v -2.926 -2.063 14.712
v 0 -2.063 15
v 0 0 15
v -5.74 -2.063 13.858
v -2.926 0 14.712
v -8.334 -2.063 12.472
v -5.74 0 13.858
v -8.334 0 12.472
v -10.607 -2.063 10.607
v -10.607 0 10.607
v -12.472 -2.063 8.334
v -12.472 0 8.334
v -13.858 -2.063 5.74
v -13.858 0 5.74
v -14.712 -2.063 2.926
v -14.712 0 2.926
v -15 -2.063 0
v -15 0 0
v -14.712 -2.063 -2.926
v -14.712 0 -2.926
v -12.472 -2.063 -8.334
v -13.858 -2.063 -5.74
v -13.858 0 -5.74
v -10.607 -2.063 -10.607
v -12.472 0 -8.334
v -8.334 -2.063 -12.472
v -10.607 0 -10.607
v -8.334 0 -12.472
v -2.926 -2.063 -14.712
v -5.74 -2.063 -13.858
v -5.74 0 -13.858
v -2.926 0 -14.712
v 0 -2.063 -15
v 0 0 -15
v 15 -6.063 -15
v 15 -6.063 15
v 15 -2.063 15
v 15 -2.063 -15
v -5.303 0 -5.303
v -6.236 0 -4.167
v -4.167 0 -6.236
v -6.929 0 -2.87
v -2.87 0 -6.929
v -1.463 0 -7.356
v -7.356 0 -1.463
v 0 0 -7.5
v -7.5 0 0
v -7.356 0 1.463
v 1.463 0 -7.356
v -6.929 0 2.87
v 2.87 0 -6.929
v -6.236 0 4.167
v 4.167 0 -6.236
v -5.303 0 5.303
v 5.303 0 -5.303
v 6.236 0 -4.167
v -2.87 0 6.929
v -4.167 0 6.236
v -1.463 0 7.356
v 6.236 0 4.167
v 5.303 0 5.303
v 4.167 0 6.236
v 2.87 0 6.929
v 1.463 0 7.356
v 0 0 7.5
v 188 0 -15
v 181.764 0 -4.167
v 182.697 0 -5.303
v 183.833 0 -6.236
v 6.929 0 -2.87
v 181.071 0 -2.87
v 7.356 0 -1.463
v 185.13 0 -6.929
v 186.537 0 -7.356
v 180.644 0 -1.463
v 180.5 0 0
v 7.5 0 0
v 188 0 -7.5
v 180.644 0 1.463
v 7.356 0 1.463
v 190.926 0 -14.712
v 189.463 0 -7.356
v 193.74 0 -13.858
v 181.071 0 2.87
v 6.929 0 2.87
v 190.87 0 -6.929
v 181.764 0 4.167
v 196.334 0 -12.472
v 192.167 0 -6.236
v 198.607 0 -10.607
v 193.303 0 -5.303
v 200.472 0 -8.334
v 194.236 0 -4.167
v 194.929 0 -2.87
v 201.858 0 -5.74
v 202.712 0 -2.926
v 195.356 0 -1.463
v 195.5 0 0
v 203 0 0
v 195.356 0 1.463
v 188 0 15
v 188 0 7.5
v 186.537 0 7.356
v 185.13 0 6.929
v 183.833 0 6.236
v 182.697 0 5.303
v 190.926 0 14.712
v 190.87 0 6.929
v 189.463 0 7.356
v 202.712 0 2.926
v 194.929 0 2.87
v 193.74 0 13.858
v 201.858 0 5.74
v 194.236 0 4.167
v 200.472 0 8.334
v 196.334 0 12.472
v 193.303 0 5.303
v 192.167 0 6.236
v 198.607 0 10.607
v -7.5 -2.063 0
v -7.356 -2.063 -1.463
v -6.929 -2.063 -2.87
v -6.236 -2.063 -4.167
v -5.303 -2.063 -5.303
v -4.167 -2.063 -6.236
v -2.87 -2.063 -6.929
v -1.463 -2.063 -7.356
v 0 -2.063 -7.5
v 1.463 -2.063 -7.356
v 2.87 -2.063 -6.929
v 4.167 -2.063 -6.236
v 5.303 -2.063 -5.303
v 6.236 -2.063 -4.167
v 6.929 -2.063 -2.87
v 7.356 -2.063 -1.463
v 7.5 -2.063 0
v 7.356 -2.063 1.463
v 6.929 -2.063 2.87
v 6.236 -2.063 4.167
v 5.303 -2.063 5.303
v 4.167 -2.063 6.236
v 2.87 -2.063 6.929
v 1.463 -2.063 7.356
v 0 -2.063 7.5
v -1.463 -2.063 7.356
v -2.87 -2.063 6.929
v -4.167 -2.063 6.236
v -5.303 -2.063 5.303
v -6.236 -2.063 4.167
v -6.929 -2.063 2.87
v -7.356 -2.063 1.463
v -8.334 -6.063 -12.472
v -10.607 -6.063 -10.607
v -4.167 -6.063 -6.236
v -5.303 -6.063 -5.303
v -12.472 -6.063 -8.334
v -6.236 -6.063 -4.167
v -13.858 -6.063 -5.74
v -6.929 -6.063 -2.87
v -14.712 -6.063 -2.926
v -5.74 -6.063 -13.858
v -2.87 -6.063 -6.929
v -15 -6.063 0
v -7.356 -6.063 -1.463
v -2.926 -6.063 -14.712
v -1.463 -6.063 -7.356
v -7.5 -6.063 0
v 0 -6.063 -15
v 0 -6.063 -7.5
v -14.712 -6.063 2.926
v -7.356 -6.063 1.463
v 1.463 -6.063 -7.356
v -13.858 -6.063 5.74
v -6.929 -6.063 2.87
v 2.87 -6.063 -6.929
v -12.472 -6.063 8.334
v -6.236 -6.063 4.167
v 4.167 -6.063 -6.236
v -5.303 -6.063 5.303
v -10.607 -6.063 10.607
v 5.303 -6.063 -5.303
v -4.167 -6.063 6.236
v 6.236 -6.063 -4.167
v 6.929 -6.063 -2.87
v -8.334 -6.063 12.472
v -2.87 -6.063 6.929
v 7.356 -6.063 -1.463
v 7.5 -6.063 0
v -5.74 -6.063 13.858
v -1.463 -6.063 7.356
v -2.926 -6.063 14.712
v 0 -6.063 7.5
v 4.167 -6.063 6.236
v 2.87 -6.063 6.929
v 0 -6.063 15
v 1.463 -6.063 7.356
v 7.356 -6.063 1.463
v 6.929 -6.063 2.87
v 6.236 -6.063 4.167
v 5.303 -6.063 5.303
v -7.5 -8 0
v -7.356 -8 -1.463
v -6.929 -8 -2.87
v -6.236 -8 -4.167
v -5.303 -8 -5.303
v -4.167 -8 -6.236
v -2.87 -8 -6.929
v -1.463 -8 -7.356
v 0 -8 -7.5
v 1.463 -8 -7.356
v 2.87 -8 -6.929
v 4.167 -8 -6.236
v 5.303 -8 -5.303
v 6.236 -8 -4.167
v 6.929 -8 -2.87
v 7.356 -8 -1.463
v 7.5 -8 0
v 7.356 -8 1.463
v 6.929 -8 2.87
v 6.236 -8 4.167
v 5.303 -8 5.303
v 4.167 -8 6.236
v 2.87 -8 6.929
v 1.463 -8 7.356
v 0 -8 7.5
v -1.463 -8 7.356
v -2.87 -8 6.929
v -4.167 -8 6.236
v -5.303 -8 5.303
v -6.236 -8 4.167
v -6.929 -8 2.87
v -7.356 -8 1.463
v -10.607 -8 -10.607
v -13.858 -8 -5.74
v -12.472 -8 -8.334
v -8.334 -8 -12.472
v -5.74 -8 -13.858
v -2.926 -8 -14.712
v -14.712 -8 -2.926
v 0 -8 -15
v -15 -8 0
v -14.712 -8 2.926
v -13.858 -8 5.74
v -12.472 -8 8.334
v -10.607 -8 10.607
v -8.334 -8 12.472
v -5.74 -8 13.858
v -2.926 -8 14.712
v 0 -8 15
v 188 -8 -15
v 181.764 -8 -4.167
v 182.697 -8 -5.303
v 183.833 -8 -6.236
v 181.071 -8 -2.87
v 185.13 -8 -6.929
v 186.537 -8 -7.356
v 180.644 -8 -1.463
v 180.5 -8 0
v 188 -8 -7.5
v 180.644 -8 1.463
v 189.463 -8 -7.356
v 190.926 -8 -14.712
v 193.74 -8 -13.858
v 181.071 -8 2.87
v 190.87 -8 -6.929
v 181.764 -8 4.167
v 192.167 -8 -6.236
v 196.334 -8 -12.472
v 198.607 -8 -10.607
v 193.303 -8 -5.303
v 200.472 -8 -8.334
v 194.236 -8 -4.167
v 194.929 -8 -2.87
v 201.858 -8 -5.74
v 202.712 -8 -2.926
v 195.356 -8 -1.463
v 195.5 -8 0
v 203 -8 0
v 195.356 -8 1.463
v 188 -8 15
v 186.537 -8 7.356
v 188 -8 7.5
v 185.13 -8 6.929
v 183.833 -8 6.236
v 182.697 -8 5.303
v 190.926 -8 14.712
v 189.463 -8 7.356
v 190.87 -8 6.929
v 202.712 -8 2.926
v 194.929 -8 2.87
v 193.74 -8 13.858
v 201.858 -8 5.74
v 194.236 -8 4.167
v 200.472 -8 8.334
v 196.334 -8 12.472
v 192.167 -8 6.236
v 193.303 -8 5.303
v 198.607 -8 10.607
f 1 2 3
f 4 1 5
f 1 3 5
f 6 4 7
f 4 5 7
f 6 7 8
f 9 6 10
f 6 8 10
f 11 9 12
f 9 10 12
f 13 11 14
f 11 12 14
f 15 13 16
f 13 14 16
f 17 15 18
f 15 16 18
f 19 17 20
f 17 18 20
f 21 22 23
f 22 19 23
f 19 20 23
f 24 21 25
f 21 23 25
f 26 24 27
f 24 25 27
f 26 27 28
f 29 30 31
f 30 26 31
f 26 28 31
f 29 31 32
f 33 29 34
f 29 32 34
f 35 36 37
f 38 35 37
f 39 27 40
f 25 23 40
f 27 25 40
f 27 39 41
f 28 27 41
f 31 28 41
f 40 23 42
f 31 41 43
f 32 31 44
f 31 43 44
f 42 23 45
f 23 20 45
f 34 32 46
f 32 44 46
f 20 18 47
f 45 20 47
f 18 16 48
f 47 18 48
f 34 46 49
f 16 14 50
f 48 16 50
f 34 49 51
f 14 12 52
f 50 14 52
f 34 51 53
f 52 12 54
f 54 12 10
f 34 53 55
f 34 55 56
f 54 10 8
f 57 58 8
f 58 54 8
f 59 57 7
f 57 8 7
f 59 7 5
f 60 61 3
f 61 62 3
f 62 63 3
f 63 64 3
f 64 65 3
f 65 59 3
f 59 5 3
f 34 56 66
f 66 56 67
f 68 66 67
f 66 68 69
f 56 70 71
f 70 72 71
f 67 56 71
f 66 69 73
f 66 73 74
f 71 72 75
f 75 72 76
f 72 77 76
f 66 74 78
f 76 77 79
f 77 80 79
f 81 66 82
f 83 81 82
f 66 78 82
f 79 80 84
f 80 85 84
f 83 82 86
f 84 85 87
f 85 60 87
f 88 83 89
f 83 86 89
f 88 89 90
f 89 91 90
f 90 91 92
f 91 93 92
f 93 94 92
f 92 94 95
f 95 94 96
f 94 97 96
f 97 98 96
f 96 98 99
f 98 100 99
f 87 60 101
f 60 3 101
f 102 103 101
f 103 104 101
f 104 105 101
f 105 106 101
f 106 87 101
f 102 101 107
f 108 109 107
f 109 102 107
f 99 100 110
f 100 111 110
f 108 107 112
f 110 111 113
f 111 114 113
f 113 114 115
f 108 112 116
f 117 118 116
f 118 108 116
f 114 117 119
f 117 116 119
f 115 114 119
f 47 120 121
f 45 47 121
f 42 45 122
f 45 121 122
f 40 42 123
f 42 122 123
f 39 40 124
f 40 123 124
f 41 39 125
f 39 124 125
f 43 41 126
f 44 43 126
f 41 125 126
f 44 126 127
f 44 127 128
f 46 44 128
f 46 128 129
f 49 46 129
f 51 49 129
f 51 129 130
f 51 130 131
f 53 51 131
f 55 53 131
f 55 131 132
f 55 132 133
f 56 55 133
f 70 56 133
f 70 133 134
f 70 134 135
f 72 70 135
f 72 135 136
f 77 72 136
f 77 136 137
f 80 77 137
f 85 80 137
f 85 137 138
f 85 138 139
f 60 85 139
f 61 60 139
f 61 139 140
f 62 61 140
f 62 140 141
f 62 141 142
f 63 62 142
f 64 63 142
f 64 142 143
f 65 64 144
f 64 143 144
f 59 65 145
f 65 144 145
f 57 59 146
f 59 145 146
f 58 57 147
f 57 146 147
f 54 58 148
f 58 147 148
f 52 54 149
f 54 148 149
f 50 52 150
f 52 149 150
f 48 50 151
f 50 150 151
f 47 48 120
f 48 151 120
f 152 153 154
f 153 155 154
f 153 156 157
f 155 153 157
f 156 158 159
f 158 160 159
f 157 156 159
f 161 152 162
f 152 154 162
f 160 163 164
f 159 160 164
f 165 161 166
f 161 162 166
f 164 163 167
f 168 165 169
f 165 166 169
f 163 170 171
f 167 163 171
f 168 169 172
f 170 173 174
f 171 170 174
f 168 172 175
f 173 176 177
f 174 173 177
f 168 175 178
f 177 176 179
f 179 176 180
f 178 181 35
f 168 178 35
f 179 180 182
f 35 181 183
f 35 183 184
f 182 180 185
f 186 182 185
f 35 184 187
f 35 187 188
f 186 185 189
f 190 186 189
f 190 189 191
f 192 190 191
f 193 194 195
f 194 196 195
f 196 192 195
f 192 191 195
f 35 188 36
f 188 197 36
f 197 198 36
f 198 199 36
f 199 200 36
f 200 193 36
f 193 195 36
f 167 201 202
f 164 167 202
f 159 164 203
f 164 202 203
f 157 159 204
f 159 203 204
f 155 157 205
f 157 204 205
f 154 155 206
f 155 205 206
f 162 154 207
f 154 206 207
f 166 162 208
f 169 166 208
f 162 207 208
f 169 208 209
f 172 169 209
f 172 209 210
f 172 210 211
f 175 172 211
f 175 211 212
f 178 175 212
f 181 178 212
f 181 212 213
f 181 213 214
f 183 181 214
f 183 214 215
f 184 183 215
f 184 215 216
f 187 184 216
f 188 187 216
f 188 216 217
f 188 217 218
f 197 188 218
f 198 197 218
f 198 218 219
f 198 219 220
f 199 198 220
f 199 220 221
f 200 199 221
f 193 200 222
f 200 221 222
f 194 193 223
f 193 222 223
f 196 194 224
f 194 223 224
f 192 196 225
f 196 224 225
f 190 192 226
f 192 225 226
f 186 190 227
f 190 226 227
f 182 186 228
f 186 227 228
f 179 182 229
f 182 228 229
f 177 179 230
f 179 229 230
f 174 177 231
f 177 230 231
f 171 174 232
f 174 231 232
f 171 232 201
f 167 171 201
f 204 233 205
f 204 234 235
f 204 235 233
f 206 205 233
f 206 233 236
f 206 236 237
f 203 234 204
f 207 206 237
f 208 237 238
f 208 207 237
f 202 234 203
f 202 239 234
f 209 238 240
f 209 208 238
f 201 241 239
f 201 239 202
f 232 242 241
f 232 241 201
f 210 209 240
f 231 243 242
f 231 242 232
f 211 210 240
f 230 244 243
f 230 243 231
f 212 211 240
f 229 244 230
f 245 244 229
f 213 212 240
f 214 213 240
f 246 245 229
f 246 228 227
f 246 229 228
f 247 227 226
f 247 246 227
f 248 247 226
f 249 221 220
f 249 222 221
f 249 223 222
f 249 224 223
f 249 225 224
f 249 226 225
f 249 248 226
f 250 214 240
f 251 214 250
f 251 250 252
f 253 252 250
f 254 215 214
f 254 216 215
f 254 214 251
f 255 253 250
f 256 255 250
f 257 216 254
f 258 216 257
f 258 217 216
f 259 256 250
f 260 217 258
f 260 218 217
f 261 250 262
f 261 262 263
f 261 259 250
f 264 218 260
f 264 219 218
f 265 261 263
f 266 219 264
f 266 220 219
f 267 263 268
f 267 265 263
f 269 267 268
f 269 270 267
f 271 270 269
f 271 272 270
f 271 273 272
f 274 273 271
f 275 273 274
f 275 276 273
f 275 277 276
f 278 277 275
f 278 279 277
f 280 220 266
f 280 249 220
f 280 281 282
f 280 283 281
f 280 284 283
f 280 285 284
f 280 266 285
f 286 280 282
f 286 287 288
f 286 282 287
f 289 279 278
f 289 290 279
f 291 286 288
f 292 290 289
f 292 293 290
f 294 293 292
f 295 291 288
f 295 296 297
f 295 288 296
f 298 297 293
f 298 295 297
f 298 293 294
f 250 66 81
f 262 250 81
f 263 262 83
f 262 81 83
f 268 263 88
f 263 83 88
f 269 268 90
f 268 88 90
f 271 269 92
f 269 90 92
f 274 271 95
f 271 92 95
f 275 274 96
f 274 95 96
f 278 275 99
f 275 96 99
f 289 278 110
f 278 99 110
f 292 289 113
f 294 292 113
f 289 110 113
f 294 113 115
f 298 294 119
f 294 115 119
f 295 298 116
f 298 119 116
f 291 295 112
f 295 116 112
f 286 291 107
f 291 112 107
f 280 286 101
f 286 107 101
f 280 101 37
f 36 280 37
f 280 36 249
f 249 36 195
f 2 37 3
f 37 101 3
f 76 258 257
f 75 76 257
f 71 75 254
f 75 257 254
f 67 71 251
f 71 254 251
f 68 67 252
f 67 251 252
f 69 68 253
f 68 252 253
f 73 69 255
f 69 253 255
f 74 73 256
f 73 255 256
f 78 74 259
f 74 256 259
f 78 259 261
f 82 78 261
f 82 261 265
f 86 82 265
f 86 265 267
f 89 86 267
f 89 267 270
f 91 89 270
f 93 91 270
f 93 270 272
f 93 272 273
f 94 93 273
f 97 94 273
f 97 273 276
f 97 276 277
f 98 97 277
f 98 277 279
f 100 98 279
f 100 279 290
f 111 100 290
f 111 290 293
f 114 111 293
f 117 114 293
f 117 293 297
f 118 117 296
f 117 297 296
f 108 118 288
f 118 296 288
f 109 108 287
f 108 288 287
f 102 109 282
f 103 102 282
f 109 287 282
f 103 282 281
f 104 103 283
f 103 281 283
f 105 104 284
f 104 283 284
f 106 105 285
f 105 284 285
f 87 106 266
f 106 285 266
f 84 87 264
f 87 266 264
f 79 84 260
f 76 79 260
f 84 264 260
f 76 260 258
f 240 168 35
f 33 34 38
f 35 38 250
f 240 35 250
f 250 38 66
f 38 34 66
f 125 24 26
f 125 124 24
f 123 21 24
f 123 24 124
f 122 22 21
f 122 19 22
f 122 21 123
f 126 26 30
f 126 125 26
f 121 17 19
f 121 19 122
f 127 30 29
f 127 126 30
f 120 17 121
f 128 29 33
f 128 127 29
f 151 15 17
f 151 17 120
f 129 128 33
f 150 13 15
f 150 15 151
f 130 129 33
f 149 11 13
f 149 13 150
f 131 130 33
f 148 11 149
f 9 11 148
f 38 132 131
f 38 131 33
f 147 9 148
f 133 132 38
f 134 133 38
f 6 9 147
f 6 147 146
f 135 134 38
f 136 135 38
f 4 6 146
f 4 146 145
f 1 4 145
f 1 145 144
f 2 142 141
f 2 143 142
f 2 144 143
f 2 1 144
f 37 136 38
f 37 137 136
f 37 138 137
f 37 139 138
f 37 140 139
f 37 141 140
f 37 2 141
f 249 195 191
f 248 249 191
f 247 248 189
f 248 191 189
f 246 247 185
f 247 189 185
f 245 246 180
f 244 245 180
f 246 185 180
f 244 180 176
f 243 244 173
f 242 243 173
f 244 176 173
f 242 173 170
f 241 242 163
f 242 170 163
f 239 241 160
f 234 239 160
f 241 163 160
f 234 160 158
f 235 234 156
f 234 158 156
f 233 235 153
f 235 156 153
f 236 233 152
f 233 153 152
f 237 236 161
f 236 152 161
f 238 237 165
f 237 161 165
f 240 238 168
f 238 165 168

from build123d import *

# Parameters (mm, degrees)
F1_DEPTH = 8
F2_D     = 15
F3_D     = 15
F5_W     = 30
F5_H     = 4
F6_DEPTH = 30.001


with BuildPart() as f1:
    # F0 (on Front) → F1 (new body)
    with BuildSketch(Plane.XZ):
        with BuildLine():
            Line((188, 15), (0, 15))
            ThreePointArc((0, 15), (-15, 0), (0, -15))
            Line((0, -15), (188, -15))
            ThreePointArc((188, -15), (203, 0), (188, 15))
        make_face()
    extrude(amount=F1_DEPTH)

    # F2 (through all)
    with Locations(Plane(origin=(0, 0, 0), x_dir=(1, 0, 0), z_dir=(0, 1, 0))):
        with Locations((0, 0)):
            Hole(F2_D / 2)

    # F3 (through all)
    with Locations(Plane(origin=(0, 0, 0), x_dir=(1, 0, 0), z_dir=(0, 1, 0))):
        with Locations((188, 0)):
            Hole(F3_D / 2)

    # F5 (on offset) → F6 (cut, through all)
    with BuildSketch(Plane.XY.offset(15)):
        with Locations((0, -4.0625976841)):
            Rectangle(F5_W, F5_H)
    extrude(amount=-F6_DEPTH, mode=Mode.SUBTRACT)


solid = f1.part
